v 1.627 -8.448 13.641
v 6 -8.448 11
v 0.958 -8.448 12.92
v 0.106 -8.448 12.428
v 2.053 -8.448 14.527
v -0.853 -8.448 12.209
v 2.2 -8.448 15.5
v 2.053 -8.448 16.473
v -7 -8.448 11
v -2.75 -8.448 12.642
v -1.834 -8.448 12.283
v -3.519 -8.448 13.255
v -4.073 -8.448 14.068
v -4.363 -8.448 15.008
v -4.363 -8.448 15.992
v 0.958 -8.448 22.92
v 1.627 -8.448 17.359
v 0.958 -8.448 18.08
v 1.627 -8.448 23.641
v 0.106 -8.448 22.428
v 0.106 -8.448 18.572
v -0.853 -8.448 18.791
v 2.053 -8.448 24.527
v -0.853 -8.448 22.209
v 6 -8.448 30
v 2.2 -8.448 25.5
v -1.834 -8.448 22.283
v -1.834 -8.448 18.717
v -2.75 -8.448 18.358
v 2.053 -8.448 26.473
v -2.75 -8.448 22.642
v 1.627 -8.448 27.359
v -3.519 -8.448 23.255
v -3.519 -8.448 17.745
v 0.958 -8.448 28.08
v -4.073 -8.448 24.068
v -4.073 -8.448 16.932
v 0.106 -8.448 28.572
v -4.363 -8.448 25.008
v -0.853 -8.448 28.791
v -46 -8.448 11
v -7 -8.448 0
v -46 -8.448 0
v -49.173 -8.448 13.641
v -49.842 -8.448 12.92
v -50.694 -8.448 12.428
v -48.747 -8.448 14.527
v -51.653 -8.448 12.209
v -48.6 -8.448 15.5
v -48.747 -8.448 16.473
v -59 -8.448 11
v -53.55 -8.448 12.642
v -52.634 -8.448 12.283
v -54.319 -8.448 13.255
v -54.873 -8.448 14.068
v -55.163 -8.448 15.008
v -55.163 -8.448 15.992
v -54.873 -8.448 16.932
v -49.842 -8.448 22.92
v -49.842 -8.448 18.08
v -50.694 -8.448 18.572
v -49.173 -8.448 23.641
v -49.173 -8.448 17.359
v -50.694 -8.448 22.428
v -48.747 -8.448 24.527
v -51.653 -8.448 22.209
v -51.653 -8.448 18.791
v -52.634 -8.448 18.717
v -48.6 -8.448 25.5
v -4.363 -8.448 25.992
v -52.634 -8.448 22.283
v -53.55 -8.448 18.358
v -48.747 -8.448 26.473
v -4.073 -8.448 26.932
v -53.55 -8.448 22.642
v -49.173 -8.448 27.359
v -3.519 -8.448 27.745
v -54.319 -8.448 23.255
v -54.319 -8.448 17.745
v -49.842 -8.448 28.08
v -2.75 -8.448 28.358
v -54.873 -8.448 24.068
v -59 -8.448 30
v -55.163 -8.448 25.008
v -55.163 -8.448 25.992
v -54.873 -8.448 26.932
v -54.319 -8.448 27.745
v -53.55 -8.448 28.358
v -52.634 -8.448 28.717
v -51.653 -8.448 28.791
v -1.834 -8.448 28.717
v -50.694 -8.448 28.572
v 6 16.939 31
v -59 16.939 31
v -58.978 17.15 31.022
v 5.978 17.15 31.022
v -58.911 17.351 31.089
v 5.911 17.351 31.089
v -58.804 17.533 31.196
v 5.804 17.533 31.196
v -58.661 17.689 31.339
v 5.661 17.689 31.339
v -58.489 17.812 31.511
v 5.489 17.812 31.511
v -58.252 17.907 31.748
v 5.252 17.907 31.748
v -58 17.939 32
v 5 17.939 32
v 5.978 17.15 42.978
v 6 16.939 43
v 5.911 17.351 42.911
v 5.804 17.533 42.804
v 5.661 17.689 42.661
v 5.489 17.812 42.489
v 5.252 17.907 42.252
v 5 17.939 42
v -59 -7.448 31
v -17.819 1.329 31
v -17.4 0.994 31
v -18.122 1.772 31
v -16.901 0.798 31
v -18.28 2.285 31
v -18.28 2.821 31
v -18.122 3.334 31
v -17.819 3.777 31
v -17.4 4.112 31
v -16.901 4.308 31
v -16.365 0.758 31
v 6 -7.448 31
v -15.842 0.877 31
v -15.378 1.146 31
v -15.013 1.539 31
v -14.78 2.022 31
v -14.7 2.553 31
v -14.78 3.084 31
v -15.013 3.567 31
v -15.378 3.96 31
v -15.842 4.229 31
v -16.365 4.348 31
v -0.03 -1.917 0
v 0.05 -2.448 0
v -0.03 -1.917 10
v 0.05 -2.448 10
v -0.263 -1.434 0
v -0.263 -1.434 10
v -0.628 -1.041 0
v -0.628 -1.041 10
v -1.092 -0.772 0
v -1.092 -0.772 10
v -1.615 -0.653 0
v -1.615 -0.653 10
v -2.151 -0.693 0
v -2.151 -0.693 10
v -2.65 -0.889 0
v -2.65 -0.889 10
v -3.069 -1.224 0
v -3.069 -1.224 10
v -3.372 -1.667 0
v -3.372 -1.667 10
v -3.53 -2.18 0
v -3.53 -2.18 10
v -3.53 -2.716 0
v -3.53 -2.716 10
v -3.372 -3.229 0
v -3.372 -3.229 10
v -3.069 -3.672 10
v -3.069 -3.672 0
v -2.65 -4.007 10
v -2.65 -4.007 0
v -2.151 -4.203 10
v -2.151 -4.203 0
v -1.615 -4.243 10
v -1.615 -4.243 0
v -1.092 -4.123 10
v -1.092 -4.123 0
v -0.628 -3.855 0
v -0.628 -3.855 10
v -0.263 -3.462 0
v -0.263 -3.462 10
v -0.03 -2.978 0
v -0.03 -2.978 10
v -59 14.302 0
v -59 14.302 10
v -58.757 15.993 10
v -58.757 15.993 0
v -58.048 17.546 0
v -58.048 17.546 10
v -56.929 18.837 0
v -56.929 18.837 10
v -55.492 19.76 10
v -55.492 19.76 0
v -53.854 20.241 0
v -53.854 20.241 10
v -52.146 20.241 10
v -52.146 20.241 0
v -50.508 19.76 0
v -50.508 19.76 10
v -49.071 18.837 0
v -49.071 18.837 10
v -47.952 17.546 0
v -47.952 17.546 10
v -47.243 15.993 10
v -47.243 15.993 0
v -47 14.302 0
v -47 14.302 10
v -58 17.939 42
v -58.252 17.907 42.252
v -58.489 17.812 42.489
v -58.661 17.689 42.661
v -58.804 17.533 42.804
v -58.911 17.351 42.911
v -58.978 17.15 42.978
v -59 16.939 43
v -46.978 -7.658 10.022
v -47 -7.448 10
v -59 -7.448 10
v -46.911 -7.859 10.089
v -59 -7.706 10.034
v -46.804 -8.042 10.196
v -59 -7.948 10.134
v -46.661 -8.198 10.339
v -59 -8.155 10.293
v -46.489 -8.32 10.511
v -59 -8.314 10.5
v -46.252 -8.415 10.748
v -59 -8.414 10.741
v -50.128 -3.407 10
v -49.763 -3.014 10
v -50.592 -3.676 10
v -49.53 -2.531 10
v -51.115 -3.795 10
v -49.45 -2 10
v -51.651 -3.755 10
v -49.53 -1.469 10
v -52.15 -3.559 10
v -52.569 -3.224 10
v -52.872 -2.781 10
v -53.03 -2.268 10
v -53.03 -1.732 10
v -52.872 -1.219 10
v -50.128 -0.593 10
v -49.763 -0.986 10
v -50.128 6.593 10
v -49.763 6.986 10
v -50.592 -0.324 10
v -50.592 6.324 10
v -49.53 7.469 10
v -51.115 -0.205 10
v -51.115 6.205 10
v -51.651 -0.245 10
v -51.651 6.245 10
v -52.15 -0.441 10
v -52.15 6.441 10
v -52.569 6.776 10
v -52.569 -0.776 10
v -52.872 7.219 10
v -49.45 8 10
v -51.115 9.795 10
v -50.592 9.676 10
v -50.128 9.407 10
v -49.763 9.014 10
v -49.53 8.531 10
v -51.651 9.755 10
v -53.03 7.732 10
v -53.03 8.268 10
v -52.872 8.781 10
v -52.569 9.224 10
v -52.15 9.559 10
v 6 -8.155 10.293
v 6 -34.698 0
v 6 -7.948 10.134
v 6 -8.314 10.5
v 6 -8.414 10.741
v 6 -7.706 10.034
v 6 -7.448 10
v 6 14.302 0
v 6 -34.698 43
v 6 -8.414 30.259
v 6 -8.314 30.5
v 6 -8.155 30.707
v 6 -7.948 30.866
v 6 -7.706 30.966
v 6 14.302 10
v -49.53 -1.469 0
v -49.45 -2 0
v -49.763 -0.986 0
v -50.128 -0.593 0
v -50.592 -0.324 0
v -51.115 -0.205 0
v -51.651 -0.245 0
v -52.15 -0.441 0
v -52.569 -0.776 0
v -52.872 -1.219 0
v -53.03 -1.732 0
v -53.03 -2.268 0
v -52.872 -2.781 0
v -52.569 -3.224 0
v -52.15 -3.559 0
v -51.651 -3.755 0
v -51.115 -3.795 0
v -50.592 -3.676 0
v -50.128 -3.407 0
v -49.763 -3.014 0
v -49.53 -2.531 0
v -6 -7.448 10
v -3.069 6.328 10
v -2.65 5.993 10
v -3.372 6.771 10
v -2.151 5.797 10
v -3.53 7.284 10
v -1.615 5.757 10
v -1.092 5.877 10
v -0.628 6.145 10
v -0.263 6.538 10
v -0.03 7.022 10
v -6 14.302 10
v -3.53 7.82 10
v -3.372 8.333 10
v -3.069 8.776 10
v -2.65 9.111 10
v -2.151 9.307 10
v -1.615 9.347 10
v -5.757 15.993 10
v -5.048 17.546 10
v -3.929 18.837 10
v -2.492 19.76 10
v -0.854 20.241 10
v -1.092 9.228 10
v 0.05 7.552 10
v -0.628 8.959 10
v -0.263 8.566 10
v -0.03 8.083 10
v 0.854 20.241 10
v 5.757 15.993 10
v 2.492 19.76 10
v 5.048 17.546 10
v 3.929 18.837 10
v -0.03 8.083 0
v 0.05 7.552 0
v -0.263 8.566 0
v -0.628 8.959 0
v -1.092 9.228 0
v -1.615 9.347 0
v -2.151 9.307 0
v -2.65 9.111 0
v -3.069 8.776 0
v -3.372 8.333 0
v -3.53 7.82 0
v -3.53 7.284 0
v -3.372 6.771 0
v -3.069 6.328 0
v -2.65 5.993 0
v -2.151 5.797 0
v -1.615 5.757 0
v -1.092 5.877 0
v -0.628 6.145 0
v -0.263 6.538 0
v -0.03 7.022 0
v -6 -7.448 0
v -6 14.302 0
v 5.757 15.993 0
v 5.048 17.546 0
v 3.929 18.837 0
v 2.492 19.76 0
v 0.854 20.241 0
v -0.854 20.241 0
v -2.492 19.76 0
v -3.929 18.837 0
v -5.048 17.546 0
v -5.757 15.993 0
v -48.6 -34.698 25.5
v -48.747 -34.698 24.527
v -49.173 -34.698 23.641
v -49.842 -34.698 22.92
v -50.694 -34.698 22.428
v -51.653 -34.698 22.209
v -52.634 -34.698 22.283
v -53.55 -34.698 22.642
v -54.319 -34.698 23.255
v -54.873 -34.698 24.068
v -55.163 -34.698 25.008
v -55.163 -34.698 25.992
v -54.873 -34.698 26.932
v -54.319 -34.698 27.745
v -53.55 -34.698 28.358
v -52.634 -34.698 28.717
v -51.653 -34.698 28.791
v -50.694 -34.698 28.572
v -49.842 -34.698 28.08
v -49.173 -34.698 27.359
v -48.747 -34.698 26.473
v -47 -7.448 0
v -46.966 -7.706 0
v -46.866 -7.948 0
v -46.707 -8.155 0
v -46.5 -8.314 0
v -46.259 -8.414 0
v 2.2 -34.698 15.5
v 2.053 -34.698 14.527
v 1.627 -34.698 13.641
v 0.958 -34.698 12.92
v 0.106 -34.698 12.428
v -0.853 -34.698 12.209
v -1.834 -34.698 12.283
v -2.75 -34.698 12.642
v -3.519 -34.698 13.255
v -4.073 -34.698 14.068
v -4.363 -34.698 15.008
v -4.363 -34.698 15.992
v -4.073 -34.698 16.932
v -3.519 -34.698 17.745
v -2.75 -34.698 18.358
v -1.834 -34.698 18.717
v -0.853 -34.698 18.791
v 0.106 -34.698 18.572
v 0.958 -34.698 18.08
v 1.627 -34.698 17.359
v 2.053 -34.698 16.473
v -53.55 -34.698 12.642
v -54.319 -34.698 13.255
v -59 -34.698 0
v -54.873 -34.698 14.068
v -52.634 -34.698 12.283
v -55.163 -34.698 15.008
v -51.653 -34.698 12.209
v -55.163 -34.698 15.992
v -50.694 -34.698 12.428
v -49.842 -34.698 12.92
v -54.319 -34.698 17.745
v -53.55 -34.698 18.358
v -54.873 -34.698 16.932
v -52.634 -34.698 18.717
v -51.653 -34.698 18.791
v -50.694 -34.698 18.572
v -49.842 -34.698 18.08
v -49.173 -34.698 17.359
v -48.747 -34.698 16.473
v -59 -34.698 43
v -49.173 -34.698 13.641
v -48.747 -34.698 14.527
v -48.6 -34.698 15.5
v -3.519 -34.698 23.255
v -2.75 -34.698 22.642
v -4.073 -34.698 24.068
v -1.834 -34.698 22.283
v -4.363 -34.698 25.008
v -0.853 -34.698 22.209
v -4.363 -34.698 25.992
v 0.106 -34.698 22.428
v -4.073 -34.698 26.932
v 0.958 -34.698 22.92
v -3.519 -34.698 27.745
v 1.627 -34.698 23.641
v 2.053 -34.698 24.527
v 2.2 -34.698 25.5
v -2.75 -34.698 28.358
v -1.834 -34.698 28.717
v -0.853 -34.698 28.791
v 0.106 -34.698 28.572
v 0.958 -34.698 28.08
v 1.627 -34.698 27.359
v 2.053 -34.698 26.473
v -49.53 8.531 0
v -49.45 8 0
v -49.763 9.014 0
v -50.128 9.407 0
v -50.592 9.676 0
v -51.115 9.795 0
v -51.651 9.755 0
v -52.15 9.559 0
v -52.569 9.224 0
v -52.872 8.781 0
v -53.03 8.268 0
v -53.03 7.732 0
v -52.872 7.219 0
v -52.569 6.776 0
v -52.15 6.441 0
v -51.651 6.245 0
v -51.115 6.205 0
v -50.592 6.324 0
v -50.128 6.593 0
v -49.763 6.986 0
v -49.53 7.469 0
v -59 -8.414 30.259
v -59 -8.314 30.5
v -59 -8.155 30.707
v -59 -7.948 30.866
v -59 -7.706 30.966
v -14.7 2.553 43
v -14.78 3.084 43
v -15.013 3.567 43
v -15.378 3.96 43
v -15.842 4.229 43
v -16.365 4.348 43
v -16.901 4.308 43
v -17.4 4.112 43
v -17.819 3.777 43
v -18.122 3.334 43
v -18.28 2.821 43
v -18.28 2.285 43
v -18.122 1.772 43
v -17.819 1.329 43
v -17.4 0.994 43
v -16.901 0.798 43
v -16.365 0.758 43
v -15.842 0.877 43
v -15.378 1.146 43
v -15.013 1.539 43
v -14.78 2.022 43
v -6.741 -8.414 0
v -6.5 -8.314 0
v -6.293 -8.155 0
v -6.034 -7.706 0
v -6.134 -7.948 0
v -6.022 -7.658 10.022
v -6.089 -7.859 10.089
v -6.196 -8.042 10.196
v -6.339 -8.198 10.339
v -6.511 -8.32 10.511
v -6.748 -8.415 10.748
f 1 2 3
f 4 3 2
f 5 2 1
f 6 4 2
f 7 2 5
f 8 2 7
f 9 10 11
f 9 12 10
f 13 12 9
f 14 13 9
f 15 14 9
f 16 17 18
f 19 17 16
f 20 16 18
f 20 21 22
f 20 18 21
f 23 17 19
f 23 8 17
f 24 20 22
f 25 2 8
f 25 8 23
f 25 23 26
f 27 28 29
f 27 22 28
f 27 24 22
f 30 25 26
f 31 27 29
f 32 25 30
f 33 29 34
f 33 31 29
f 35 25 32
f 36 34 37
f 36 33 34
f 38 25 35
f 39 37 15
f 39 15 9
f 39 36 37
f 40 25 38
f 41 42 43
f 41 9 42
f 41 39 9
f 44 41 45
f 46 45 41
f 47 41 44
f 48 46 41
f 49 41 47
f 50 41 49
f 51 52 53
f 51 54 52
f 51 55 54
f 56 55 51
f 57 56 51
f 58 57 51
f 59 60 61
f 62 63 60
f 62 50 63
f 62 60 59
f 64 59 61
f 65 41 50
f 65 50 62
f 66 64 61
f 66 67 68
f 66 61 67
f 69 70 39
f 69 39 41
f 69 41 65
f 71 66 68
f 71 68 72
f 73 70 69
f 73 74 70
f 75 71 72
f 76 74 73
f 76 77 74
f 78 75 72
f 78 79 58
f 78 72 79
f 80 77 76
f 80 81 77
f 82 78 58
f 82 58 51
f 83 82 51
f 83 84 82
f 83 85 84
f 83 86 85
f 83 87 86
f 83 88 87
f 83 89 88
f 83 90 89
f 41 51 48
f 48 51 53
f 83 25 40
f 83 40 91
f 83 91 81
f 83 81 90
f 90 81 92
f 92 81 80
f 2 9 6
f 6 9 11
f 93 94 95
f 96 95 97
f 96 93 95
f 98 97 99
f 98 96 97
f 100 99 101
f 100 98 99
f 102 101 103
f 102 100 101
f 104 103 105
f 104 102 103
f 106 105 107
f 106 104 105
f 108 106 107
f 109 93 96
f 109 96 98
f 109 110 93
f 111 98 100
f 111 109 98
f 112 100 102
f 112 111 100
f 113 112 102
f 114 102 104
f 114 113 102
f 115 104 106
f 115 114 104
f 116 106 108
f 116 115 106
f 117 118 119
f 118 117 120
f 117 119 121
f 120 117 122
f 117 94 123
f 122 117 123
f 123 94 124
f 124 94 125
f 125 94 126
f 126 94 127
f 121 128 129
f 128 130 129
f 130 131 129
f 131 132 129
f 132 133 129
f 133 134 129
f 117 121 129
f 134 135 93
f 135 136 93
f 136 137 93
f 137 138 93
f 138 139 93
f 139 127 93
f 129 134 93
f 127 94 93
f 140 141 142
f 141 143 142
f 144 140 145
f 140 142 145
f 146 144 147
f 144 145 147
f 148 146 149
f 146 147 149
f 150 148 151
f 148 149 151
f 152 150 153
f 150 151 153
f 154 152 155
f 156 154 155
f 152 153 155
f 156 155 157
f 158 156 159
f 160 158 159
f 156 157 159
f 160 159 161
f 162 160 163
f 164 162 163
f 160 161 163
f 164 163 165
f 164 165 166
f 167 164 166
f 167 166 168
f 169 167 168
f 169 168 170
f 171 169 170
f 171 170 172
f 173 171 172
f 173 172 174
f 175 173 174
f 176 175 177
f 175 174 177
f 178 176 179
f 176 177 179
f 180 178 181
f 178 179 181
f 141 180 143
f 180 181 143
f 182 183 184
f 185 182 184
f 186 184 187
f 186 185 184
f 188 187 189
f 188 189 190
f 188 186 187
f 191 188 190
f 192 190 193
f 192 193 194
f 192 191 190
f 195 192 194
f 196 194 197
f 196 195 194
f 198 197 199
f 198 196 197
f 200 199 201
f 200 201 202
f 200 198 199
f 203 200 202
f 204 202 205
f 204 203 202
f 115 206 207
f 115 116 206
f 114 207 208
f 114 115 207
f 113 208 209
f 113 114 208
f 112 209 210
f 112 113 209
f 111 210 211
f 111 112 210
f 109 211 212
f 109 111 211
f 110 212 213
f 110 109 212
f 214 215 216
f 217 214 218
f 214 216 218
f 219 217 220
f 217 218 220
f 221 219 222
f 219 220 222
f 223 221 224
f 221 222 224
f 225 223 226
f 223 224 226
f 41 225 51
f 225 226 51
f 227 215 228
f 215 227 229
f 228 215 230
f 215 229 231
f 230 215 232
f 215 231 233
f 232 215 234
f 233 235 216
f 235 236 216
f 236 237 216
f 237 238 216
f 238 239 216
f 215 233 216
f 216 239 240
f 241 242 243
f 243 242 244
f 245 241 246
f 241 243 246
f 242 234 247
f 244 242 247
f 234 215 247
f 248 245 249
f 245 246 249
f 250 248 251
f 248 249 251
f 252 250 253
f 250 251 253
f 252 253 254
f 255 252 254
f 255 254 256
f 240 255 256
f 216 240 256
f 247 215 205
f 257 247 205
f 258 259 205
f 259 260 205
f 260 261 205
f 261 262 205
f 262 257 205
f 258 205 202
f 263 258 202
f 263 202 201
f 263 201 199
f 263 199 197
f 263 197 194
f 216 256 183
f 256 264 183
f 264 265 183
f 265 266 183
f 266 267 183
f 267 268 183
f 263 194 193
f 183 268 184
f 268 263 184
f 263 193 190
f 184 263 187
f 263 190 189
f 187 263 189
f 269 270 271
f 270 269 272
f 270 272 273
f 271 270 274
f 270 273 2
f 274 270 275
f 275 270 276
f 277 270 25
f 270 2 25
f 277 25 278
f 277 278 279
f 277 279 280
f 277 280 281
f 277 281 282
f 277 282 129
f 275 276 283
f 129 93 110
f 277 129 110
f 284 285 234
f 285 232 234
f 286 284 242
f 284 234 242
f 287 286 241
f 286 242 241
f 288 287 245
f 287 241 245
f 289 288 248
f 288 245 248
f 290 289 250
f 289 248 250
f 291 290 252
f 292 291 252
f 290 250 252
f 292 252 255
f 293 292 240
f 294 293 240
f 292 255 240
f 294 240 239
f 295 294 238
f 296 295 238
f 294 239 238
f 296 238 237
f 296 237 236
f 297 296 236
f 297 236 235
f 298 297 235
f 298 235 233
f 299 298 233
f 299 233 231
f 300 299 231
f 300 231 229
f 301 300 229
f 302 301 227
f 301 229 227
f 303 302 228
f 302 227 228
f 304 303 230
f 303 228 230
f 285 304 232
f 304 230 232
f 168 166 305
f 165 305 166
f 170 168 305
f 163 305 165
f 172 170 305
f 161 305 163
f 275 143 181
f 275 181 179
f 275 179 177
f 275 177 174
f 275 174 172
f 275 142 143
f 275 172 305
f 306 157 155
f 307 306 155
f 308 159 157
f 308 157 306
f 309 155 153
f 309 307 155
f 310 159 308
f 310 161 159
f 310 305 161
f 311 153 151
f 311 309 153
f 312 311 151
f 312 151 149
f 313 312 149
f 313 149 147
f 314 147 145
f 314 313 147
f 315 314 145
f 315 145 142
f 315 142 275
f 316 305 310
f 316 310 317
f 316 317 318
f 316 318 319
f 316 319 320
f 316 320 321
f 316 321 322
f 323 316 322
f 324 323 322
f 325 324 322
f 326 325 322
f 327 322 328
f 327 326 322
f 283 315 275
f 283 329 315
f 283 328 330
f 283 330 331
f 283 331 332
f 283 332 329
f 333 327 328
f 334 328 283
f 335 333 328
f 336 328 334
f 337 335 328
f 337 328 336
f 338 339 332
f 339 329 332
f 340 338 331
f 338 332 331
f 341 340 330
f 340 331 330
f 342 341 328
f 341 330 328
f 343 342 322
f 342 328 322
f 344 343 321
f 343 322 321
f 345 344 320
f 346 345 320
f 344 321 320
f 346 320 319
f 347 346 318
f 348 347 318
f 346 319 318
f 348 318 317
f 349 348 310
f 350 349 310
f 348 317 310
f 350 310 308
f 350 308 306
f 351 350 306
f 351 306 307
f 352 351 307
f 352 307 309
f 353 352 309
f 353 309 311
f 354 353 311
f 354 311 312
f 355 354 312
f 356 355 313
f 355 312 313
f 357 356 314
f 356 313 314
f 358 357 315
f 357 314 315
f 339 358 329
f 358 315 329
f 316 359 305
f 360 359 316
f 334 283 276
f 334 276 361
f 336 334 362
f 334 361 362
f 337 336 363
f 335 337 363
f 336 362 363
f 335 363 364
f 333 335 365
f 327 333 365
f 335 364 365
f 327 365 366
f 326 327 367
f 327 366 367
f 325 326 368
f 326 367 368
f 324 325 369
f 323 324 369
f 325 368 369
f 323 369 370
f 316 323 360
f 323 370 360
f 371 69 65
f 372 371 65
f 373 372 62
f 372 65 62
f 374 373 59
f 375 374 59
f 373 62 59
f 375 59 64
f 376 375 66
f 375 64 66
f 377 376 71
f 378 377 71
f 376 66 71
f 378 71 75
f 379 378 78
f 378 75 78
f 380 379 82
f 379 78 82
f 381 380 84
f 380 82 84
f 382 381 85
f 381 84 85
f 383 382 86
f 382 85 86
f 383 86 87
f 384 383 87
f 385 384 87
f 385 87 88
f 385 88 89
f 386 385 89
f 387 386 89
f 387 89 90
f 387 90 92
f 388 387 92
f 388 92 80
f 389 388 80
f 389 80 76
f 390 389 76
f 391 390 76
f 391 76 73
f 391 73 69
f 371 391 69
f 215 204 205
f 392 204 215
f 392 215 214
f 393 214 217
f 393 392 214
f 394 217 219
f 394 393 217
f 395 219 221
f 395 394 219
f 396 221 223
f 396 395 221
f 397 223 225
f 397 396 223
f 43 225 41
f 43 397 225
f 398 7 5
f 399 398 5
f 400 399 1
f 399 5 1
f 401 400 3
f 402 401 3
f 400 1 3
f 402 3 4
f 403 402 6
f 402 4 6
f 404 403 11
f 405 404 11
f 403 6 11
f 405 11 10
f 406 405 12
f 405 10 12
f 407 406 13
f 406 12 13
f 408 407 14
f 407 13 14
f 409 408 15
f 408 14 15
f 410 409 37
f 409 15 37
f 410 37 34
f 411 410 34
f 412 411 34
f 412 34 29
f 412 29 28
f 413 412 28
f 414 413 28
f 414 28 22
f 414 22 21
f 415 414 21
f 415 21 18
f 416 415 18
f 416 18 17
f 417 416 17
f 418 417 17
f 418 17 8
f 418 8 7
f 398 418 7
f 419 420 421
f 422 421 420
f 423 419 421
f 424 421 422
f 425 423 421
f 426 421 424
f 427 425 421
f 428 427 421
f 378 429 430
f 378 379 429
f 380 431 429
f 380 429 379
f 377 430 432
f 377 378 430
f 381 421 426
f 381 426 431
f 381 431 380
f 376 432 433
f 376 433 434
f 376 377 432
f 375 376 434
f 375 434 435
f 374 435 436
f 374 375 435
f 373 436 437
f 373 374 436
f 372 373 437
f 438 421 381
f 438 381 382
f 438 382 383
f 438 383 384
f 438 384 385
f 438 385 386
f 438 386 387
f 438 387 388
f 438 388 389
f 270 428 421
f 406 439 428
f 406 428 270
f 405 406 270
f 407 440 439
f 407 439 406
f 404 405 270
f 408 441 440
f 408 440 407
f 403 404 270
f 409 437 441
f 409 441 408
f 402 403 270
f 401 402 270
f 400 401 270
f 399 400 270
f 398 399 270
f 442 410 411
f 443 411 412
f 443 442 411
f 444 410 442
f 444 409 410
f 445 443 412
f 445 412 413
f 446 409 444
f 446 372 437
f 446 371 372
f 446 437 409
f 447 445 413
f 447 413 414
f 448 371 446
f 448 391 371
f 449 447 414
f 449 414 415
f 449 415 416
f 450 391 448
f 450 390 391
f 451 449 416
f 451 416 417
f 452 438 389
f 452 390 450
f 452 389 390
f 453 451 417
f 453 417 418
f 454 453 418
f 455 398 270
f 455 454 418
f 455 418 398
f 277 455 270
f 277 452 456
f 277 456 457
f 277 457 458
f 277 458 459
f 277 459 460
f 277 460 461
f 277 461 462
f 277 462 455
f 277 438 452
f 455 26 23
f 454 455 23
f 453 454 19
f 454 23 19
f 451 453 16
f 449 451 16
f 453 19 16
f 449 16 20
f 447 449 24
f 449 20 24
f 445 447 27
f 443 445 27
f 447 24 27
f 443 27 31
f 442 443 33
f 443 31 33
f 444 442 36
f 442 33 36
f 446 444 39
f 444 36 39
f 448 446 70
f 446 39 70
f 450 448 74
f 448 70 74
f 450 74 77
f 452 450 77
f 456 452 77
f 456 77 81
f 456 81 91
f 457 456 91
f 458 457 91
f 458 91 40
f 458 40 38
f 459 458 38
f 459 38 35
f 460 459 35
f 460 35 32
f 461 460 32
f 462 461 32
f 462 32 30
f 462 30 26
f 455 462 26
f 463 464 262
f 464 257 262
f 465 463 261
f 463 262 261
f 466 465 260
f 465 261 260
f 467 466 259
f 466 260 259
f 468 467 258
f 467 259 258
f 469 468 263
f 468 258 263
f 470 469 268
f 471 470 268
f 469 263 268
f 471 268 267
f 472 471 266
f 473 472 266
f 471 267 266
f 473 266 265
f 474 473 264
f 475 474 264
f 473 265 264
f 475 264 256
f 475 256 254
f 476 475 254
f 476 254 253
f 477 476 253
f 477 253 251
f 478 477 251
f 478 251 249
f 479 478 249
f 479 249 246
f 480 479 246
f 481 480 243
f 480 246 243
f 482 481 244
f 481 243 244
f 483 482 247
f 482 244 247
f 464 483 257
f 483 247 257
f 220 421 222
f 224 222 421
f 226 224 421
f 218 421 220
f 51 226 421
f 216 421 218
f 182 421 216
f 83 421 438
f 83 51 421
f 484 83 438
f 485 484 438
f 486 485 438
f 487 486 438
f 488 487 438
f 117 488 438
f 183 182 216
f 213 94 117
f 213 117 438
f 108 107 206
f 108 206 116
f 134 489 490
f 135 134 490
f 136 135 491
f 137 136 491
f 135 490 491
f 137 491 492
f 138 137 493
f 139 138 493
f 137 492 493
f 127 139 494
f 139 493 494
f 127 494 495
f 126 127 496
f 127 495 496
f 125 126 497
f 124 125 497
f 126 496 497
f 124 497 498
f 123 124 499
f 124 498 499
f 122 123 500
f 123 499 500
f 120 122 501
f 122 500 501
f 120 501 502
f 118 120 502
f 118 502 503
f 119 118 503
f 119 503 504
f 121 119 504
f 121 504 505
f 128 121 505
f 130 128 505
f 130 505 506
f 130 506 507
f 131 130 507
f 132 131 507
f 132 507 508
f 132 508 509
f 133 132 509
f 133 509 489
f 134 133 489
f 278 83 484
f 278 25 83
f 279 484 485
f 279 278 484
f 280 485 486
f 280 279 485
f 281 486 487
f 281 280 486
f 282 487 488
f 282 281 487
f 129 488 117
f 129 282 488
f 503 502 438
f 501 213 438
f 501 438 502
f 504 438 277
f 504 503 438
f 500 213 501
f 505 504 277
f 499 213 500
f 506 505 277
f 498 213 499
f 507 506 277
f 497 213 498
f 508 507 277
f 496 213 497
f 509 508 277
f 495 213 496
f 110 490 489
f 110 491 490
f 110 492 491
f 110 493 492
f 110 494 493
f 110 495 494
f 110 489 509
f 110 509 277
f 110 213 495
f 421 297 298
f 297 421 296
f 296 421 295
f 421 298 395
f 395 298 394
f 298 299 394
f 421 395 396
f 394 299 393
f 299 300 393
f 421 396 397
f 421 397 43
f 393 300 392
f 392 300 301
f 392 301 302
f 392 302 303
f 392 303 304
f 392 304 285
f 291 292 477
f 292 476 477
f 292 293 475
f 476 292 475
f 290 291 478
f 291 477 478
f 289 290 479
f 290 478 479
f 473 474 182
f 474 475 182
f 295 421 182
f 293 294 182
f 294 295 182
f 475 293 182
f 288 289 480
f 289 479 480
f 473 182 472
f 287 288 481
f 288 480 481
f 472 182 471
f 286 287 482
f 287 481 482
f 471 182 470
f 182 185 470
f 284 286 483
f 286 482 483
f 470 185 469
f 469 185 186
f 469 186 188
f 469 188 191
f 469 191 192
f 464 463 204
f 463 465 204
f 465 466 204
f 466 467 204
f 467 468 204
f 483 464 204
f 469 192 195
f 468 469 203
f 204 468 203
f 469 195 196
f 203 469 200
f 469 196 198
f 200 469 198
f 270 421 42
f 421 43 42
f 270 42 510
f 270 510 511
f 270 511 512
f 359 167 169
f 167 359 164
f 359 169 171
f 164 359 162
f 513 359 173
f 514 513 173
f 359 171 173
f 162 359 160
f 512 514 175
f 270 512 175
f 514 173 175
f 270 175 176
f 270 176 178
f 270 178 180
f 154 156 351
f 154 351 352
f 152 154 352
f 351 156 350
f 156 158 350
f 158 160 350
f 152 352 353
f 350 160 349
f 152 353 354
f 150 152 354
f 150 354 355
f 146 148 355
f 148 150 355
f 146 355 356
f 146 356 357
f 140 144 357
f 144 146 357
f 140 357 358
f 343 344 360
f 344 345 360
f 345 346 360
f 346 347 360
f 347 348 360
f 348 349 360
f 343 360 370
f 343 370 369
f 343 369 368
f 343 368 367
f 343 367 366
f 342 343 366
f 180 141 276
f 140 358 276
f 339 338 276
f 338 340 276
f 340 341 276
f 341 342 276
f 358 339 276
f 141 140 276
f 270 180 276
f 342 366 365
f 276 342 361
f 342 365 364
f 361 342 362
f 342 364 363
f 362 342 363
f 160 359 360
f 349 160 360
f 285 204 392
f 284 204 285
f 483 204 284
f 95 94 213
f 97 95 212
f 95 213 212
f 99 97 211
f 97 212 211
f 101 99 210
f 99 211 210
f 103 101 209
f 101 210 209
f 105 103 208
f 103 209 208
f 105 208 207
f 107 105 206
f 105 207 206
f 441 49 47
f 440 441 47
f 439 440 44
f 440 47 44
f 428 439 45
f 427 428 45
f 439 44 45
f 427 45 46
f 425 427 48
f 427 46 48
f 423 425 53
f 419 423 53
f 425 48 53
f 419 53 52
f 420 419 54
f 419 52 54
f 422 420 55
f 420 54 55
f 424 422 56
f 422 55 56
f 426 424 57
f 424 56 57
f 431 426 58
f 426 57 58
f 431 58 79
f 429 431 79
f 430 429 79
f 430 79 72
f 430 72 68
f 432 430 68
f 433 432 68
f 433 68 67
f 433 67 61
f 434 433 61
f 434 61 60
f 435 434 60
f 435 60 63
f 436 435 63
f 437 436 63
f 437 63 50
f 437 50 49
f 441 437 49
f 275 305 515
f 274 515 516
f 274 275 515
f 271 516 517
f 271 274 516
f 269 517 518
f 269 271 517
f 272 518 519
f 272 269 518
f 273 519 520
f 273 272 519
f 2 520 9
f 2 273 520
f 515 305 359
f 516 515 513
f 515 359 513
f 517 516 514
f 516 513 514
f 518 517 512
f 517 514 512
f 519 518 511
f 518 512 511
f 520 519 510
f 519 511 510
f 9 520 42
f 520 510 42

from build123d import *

# Parameters (mm, degrees)
BOSS_EXTRUDE1_DEPTH            = 10
SKETCH2_W                      = 12
SKETCH2_H                      = 12.25
BOSS_EXTRUDE2_DEPTH            = 21
SKETCH4_W                      = 65
SKETCH4_H                      = 38.636969104
BOSS_EXTRUDE3_DEPTH            = 12
F_3_6_3_6_DIAMETER_HOLE1_D     = 3.6
F_3_6_3_6_DIAMETER_HOLE1_DEPTH = 10
F_3_6_3_6_DIAMETER_HOLE1_TIP   = 1.081549114
SKETCH21_W                     = 41
SKETCH21_H                     = 12.25
BOSS_EXTRUDE4_DEPTH            = 31
SKETCH23_W                     = 65
SKETCH23_H                     = 43
BOSS_EXTRUDE6_DEPTH            = 14
FILLET1_R                      = 1
F_6_6_6_6_DIAMETER_HOLE1_D     = 6.6
SKETCH28_R                     = 1.8
CUT_EXTRUDE1_DEPTH             = 44


with BuildPart() as part:
    # Sketch1 → Boss-Extrude1 (new body)
    with BuildSketch(Plane.XY):
        with BuildLine():
            Line((-6, 14.302325581), (-6, -20.697674419))
            Line((-6, -20.697674419), (6, -20.697674419))
            Line((6, -20.697674419), (6, 14.302325581))
            ThreePointArc((6, 14.302325581), (0, 20.302325581), (-6, 14.302325581))
        make_face()
    boss_extrude1 = extrude(amount=BOSS_EXTRUDE1_DEPTH)

    # Sketch2 → Boss-Extrude2 (add)
    with BuildSketch(Plane.XY.offset(10)):
        with Locations((0, -14.572674419)):
            Rectangle(SKETCH2_W, SKETCH2_H)
    boss_extrude2 = extrude(amount=BOSS_EXTRUDE2_DEPTH)

    # Sketch4 → Boss-Extrude3 (add)
    with BuildSketch(Plane.XY.offset(31)):
        with Locations((-26.5, -1.379189867)):
            Rectangle(SKETCH4_W, SKETCH4_H)
    extrude(amount=BOSS_EXTRUDE3_DEPTH)

    # Mirror2: Boss-Extrude2 across plane
    add(boss_extrude2.mirror(Plane.ZY.offset(26.5)))

    # Mirror3: Boss-Extrude1 across plane
    add(boss_extrude1.mirror(Plane.ZY.offset(26.5)))

    # Ø3.6 (3.6) Diameter Hole1
    with Locations(Plane(origin=(0, 0, 0), x_dir=(-1, 0, 0), z_dir=(0, 0, -1))):
        with Locations((1.75, 7.55218084), (1.75, -2.44781916), (51.25, 8), (51.25, -2)):
            Hole(F_3_6_3_6_DIAMETER_HOLE1_D / 2, depth=F_3_6_3_6_DIAMETER_HOLE1_DEPTH)
            with Locations((0, 0, -(F_3_6_3_6_DIAMETER_HOLE1_DEPTH + F_3_6_3_6_DIAMETER_HOLE1_TIP / 2))):  # 118° drill point
                Cone(0, F_3_6_3_6_DIAMETER_HOLE1_D / 2, F_3_6_3_6_DIAMETER_HOLE1_TIP, mode=Mode.SUBTRACT)

    # Sketch21 → Boss-Extrude4 (add)
    with BuildSketch(Plane(origin=(0, 0, 31), x_dir=(-1, 0, 0), z_dir=(0, 0, -1))):
        with Locations((26.5, -14.572674419)):
            Rectangle(SKETCH21_W, SKETCH21_H)
    extrude(amount=BOSS_EXTRUDE4_DEPTH)

    # Sketch23 → Boss-Extrude6 (add)
    with BuildSketch(Plane.XZ.offset(20.697674419)):
        with Locations((-26.5, 21.5)):
            Rectangle(SKETCH23_W, SKETCH23_H)
    extrude(amount=BOSS_EXTRUDE6_DEPTH)

    # Fillet1
    fillet1_edges = [part.edges().sort_by_distance(p)[0] for p in [
        (-26.5, -8.447674419, 31),
        (0, -8.447674419, 10),
        (-26.5, 17.939294685, 31),
        (6, 17.939294685, 37),
        (-59, 17.939294685, 37),
        (-26.5, 17.939294685, 43),
        (-53, -8.447674419, 10),
        (-6, -8.447674419, 5),
        (-47, -8.447674419, 5),
    ]]
    fillet(fillet1_edges, radius=FILLET1_R)

    # Ø6.6 (6.6) Diameter Hole1 (through all)
    with Locations(Plane(origin=(0, -34.697674419, 0), x_dir=(-1, 0, 0), z_dir=(0, -1, 0))):
        with Locations((1.1, -15.5), (1.1, -25.5), (51.9, -15.5), (51.9, -25.5)):
            Hole(F_6_6_6_6_DIAMETER_HOLE1_D / 2)

    # Sketch28 → Cut-Extrude1 (cut, through all)
    with BuildSketch(Plane.XY.offset(43)):
        with Locations((-16.5, 2.553012267)):
            Circle(SKETCH28_R)
    extrude(amount=-CUT_EXTRUDE1_DEPTH, mode=Mode.SUBTRACT)


solid = part.part
